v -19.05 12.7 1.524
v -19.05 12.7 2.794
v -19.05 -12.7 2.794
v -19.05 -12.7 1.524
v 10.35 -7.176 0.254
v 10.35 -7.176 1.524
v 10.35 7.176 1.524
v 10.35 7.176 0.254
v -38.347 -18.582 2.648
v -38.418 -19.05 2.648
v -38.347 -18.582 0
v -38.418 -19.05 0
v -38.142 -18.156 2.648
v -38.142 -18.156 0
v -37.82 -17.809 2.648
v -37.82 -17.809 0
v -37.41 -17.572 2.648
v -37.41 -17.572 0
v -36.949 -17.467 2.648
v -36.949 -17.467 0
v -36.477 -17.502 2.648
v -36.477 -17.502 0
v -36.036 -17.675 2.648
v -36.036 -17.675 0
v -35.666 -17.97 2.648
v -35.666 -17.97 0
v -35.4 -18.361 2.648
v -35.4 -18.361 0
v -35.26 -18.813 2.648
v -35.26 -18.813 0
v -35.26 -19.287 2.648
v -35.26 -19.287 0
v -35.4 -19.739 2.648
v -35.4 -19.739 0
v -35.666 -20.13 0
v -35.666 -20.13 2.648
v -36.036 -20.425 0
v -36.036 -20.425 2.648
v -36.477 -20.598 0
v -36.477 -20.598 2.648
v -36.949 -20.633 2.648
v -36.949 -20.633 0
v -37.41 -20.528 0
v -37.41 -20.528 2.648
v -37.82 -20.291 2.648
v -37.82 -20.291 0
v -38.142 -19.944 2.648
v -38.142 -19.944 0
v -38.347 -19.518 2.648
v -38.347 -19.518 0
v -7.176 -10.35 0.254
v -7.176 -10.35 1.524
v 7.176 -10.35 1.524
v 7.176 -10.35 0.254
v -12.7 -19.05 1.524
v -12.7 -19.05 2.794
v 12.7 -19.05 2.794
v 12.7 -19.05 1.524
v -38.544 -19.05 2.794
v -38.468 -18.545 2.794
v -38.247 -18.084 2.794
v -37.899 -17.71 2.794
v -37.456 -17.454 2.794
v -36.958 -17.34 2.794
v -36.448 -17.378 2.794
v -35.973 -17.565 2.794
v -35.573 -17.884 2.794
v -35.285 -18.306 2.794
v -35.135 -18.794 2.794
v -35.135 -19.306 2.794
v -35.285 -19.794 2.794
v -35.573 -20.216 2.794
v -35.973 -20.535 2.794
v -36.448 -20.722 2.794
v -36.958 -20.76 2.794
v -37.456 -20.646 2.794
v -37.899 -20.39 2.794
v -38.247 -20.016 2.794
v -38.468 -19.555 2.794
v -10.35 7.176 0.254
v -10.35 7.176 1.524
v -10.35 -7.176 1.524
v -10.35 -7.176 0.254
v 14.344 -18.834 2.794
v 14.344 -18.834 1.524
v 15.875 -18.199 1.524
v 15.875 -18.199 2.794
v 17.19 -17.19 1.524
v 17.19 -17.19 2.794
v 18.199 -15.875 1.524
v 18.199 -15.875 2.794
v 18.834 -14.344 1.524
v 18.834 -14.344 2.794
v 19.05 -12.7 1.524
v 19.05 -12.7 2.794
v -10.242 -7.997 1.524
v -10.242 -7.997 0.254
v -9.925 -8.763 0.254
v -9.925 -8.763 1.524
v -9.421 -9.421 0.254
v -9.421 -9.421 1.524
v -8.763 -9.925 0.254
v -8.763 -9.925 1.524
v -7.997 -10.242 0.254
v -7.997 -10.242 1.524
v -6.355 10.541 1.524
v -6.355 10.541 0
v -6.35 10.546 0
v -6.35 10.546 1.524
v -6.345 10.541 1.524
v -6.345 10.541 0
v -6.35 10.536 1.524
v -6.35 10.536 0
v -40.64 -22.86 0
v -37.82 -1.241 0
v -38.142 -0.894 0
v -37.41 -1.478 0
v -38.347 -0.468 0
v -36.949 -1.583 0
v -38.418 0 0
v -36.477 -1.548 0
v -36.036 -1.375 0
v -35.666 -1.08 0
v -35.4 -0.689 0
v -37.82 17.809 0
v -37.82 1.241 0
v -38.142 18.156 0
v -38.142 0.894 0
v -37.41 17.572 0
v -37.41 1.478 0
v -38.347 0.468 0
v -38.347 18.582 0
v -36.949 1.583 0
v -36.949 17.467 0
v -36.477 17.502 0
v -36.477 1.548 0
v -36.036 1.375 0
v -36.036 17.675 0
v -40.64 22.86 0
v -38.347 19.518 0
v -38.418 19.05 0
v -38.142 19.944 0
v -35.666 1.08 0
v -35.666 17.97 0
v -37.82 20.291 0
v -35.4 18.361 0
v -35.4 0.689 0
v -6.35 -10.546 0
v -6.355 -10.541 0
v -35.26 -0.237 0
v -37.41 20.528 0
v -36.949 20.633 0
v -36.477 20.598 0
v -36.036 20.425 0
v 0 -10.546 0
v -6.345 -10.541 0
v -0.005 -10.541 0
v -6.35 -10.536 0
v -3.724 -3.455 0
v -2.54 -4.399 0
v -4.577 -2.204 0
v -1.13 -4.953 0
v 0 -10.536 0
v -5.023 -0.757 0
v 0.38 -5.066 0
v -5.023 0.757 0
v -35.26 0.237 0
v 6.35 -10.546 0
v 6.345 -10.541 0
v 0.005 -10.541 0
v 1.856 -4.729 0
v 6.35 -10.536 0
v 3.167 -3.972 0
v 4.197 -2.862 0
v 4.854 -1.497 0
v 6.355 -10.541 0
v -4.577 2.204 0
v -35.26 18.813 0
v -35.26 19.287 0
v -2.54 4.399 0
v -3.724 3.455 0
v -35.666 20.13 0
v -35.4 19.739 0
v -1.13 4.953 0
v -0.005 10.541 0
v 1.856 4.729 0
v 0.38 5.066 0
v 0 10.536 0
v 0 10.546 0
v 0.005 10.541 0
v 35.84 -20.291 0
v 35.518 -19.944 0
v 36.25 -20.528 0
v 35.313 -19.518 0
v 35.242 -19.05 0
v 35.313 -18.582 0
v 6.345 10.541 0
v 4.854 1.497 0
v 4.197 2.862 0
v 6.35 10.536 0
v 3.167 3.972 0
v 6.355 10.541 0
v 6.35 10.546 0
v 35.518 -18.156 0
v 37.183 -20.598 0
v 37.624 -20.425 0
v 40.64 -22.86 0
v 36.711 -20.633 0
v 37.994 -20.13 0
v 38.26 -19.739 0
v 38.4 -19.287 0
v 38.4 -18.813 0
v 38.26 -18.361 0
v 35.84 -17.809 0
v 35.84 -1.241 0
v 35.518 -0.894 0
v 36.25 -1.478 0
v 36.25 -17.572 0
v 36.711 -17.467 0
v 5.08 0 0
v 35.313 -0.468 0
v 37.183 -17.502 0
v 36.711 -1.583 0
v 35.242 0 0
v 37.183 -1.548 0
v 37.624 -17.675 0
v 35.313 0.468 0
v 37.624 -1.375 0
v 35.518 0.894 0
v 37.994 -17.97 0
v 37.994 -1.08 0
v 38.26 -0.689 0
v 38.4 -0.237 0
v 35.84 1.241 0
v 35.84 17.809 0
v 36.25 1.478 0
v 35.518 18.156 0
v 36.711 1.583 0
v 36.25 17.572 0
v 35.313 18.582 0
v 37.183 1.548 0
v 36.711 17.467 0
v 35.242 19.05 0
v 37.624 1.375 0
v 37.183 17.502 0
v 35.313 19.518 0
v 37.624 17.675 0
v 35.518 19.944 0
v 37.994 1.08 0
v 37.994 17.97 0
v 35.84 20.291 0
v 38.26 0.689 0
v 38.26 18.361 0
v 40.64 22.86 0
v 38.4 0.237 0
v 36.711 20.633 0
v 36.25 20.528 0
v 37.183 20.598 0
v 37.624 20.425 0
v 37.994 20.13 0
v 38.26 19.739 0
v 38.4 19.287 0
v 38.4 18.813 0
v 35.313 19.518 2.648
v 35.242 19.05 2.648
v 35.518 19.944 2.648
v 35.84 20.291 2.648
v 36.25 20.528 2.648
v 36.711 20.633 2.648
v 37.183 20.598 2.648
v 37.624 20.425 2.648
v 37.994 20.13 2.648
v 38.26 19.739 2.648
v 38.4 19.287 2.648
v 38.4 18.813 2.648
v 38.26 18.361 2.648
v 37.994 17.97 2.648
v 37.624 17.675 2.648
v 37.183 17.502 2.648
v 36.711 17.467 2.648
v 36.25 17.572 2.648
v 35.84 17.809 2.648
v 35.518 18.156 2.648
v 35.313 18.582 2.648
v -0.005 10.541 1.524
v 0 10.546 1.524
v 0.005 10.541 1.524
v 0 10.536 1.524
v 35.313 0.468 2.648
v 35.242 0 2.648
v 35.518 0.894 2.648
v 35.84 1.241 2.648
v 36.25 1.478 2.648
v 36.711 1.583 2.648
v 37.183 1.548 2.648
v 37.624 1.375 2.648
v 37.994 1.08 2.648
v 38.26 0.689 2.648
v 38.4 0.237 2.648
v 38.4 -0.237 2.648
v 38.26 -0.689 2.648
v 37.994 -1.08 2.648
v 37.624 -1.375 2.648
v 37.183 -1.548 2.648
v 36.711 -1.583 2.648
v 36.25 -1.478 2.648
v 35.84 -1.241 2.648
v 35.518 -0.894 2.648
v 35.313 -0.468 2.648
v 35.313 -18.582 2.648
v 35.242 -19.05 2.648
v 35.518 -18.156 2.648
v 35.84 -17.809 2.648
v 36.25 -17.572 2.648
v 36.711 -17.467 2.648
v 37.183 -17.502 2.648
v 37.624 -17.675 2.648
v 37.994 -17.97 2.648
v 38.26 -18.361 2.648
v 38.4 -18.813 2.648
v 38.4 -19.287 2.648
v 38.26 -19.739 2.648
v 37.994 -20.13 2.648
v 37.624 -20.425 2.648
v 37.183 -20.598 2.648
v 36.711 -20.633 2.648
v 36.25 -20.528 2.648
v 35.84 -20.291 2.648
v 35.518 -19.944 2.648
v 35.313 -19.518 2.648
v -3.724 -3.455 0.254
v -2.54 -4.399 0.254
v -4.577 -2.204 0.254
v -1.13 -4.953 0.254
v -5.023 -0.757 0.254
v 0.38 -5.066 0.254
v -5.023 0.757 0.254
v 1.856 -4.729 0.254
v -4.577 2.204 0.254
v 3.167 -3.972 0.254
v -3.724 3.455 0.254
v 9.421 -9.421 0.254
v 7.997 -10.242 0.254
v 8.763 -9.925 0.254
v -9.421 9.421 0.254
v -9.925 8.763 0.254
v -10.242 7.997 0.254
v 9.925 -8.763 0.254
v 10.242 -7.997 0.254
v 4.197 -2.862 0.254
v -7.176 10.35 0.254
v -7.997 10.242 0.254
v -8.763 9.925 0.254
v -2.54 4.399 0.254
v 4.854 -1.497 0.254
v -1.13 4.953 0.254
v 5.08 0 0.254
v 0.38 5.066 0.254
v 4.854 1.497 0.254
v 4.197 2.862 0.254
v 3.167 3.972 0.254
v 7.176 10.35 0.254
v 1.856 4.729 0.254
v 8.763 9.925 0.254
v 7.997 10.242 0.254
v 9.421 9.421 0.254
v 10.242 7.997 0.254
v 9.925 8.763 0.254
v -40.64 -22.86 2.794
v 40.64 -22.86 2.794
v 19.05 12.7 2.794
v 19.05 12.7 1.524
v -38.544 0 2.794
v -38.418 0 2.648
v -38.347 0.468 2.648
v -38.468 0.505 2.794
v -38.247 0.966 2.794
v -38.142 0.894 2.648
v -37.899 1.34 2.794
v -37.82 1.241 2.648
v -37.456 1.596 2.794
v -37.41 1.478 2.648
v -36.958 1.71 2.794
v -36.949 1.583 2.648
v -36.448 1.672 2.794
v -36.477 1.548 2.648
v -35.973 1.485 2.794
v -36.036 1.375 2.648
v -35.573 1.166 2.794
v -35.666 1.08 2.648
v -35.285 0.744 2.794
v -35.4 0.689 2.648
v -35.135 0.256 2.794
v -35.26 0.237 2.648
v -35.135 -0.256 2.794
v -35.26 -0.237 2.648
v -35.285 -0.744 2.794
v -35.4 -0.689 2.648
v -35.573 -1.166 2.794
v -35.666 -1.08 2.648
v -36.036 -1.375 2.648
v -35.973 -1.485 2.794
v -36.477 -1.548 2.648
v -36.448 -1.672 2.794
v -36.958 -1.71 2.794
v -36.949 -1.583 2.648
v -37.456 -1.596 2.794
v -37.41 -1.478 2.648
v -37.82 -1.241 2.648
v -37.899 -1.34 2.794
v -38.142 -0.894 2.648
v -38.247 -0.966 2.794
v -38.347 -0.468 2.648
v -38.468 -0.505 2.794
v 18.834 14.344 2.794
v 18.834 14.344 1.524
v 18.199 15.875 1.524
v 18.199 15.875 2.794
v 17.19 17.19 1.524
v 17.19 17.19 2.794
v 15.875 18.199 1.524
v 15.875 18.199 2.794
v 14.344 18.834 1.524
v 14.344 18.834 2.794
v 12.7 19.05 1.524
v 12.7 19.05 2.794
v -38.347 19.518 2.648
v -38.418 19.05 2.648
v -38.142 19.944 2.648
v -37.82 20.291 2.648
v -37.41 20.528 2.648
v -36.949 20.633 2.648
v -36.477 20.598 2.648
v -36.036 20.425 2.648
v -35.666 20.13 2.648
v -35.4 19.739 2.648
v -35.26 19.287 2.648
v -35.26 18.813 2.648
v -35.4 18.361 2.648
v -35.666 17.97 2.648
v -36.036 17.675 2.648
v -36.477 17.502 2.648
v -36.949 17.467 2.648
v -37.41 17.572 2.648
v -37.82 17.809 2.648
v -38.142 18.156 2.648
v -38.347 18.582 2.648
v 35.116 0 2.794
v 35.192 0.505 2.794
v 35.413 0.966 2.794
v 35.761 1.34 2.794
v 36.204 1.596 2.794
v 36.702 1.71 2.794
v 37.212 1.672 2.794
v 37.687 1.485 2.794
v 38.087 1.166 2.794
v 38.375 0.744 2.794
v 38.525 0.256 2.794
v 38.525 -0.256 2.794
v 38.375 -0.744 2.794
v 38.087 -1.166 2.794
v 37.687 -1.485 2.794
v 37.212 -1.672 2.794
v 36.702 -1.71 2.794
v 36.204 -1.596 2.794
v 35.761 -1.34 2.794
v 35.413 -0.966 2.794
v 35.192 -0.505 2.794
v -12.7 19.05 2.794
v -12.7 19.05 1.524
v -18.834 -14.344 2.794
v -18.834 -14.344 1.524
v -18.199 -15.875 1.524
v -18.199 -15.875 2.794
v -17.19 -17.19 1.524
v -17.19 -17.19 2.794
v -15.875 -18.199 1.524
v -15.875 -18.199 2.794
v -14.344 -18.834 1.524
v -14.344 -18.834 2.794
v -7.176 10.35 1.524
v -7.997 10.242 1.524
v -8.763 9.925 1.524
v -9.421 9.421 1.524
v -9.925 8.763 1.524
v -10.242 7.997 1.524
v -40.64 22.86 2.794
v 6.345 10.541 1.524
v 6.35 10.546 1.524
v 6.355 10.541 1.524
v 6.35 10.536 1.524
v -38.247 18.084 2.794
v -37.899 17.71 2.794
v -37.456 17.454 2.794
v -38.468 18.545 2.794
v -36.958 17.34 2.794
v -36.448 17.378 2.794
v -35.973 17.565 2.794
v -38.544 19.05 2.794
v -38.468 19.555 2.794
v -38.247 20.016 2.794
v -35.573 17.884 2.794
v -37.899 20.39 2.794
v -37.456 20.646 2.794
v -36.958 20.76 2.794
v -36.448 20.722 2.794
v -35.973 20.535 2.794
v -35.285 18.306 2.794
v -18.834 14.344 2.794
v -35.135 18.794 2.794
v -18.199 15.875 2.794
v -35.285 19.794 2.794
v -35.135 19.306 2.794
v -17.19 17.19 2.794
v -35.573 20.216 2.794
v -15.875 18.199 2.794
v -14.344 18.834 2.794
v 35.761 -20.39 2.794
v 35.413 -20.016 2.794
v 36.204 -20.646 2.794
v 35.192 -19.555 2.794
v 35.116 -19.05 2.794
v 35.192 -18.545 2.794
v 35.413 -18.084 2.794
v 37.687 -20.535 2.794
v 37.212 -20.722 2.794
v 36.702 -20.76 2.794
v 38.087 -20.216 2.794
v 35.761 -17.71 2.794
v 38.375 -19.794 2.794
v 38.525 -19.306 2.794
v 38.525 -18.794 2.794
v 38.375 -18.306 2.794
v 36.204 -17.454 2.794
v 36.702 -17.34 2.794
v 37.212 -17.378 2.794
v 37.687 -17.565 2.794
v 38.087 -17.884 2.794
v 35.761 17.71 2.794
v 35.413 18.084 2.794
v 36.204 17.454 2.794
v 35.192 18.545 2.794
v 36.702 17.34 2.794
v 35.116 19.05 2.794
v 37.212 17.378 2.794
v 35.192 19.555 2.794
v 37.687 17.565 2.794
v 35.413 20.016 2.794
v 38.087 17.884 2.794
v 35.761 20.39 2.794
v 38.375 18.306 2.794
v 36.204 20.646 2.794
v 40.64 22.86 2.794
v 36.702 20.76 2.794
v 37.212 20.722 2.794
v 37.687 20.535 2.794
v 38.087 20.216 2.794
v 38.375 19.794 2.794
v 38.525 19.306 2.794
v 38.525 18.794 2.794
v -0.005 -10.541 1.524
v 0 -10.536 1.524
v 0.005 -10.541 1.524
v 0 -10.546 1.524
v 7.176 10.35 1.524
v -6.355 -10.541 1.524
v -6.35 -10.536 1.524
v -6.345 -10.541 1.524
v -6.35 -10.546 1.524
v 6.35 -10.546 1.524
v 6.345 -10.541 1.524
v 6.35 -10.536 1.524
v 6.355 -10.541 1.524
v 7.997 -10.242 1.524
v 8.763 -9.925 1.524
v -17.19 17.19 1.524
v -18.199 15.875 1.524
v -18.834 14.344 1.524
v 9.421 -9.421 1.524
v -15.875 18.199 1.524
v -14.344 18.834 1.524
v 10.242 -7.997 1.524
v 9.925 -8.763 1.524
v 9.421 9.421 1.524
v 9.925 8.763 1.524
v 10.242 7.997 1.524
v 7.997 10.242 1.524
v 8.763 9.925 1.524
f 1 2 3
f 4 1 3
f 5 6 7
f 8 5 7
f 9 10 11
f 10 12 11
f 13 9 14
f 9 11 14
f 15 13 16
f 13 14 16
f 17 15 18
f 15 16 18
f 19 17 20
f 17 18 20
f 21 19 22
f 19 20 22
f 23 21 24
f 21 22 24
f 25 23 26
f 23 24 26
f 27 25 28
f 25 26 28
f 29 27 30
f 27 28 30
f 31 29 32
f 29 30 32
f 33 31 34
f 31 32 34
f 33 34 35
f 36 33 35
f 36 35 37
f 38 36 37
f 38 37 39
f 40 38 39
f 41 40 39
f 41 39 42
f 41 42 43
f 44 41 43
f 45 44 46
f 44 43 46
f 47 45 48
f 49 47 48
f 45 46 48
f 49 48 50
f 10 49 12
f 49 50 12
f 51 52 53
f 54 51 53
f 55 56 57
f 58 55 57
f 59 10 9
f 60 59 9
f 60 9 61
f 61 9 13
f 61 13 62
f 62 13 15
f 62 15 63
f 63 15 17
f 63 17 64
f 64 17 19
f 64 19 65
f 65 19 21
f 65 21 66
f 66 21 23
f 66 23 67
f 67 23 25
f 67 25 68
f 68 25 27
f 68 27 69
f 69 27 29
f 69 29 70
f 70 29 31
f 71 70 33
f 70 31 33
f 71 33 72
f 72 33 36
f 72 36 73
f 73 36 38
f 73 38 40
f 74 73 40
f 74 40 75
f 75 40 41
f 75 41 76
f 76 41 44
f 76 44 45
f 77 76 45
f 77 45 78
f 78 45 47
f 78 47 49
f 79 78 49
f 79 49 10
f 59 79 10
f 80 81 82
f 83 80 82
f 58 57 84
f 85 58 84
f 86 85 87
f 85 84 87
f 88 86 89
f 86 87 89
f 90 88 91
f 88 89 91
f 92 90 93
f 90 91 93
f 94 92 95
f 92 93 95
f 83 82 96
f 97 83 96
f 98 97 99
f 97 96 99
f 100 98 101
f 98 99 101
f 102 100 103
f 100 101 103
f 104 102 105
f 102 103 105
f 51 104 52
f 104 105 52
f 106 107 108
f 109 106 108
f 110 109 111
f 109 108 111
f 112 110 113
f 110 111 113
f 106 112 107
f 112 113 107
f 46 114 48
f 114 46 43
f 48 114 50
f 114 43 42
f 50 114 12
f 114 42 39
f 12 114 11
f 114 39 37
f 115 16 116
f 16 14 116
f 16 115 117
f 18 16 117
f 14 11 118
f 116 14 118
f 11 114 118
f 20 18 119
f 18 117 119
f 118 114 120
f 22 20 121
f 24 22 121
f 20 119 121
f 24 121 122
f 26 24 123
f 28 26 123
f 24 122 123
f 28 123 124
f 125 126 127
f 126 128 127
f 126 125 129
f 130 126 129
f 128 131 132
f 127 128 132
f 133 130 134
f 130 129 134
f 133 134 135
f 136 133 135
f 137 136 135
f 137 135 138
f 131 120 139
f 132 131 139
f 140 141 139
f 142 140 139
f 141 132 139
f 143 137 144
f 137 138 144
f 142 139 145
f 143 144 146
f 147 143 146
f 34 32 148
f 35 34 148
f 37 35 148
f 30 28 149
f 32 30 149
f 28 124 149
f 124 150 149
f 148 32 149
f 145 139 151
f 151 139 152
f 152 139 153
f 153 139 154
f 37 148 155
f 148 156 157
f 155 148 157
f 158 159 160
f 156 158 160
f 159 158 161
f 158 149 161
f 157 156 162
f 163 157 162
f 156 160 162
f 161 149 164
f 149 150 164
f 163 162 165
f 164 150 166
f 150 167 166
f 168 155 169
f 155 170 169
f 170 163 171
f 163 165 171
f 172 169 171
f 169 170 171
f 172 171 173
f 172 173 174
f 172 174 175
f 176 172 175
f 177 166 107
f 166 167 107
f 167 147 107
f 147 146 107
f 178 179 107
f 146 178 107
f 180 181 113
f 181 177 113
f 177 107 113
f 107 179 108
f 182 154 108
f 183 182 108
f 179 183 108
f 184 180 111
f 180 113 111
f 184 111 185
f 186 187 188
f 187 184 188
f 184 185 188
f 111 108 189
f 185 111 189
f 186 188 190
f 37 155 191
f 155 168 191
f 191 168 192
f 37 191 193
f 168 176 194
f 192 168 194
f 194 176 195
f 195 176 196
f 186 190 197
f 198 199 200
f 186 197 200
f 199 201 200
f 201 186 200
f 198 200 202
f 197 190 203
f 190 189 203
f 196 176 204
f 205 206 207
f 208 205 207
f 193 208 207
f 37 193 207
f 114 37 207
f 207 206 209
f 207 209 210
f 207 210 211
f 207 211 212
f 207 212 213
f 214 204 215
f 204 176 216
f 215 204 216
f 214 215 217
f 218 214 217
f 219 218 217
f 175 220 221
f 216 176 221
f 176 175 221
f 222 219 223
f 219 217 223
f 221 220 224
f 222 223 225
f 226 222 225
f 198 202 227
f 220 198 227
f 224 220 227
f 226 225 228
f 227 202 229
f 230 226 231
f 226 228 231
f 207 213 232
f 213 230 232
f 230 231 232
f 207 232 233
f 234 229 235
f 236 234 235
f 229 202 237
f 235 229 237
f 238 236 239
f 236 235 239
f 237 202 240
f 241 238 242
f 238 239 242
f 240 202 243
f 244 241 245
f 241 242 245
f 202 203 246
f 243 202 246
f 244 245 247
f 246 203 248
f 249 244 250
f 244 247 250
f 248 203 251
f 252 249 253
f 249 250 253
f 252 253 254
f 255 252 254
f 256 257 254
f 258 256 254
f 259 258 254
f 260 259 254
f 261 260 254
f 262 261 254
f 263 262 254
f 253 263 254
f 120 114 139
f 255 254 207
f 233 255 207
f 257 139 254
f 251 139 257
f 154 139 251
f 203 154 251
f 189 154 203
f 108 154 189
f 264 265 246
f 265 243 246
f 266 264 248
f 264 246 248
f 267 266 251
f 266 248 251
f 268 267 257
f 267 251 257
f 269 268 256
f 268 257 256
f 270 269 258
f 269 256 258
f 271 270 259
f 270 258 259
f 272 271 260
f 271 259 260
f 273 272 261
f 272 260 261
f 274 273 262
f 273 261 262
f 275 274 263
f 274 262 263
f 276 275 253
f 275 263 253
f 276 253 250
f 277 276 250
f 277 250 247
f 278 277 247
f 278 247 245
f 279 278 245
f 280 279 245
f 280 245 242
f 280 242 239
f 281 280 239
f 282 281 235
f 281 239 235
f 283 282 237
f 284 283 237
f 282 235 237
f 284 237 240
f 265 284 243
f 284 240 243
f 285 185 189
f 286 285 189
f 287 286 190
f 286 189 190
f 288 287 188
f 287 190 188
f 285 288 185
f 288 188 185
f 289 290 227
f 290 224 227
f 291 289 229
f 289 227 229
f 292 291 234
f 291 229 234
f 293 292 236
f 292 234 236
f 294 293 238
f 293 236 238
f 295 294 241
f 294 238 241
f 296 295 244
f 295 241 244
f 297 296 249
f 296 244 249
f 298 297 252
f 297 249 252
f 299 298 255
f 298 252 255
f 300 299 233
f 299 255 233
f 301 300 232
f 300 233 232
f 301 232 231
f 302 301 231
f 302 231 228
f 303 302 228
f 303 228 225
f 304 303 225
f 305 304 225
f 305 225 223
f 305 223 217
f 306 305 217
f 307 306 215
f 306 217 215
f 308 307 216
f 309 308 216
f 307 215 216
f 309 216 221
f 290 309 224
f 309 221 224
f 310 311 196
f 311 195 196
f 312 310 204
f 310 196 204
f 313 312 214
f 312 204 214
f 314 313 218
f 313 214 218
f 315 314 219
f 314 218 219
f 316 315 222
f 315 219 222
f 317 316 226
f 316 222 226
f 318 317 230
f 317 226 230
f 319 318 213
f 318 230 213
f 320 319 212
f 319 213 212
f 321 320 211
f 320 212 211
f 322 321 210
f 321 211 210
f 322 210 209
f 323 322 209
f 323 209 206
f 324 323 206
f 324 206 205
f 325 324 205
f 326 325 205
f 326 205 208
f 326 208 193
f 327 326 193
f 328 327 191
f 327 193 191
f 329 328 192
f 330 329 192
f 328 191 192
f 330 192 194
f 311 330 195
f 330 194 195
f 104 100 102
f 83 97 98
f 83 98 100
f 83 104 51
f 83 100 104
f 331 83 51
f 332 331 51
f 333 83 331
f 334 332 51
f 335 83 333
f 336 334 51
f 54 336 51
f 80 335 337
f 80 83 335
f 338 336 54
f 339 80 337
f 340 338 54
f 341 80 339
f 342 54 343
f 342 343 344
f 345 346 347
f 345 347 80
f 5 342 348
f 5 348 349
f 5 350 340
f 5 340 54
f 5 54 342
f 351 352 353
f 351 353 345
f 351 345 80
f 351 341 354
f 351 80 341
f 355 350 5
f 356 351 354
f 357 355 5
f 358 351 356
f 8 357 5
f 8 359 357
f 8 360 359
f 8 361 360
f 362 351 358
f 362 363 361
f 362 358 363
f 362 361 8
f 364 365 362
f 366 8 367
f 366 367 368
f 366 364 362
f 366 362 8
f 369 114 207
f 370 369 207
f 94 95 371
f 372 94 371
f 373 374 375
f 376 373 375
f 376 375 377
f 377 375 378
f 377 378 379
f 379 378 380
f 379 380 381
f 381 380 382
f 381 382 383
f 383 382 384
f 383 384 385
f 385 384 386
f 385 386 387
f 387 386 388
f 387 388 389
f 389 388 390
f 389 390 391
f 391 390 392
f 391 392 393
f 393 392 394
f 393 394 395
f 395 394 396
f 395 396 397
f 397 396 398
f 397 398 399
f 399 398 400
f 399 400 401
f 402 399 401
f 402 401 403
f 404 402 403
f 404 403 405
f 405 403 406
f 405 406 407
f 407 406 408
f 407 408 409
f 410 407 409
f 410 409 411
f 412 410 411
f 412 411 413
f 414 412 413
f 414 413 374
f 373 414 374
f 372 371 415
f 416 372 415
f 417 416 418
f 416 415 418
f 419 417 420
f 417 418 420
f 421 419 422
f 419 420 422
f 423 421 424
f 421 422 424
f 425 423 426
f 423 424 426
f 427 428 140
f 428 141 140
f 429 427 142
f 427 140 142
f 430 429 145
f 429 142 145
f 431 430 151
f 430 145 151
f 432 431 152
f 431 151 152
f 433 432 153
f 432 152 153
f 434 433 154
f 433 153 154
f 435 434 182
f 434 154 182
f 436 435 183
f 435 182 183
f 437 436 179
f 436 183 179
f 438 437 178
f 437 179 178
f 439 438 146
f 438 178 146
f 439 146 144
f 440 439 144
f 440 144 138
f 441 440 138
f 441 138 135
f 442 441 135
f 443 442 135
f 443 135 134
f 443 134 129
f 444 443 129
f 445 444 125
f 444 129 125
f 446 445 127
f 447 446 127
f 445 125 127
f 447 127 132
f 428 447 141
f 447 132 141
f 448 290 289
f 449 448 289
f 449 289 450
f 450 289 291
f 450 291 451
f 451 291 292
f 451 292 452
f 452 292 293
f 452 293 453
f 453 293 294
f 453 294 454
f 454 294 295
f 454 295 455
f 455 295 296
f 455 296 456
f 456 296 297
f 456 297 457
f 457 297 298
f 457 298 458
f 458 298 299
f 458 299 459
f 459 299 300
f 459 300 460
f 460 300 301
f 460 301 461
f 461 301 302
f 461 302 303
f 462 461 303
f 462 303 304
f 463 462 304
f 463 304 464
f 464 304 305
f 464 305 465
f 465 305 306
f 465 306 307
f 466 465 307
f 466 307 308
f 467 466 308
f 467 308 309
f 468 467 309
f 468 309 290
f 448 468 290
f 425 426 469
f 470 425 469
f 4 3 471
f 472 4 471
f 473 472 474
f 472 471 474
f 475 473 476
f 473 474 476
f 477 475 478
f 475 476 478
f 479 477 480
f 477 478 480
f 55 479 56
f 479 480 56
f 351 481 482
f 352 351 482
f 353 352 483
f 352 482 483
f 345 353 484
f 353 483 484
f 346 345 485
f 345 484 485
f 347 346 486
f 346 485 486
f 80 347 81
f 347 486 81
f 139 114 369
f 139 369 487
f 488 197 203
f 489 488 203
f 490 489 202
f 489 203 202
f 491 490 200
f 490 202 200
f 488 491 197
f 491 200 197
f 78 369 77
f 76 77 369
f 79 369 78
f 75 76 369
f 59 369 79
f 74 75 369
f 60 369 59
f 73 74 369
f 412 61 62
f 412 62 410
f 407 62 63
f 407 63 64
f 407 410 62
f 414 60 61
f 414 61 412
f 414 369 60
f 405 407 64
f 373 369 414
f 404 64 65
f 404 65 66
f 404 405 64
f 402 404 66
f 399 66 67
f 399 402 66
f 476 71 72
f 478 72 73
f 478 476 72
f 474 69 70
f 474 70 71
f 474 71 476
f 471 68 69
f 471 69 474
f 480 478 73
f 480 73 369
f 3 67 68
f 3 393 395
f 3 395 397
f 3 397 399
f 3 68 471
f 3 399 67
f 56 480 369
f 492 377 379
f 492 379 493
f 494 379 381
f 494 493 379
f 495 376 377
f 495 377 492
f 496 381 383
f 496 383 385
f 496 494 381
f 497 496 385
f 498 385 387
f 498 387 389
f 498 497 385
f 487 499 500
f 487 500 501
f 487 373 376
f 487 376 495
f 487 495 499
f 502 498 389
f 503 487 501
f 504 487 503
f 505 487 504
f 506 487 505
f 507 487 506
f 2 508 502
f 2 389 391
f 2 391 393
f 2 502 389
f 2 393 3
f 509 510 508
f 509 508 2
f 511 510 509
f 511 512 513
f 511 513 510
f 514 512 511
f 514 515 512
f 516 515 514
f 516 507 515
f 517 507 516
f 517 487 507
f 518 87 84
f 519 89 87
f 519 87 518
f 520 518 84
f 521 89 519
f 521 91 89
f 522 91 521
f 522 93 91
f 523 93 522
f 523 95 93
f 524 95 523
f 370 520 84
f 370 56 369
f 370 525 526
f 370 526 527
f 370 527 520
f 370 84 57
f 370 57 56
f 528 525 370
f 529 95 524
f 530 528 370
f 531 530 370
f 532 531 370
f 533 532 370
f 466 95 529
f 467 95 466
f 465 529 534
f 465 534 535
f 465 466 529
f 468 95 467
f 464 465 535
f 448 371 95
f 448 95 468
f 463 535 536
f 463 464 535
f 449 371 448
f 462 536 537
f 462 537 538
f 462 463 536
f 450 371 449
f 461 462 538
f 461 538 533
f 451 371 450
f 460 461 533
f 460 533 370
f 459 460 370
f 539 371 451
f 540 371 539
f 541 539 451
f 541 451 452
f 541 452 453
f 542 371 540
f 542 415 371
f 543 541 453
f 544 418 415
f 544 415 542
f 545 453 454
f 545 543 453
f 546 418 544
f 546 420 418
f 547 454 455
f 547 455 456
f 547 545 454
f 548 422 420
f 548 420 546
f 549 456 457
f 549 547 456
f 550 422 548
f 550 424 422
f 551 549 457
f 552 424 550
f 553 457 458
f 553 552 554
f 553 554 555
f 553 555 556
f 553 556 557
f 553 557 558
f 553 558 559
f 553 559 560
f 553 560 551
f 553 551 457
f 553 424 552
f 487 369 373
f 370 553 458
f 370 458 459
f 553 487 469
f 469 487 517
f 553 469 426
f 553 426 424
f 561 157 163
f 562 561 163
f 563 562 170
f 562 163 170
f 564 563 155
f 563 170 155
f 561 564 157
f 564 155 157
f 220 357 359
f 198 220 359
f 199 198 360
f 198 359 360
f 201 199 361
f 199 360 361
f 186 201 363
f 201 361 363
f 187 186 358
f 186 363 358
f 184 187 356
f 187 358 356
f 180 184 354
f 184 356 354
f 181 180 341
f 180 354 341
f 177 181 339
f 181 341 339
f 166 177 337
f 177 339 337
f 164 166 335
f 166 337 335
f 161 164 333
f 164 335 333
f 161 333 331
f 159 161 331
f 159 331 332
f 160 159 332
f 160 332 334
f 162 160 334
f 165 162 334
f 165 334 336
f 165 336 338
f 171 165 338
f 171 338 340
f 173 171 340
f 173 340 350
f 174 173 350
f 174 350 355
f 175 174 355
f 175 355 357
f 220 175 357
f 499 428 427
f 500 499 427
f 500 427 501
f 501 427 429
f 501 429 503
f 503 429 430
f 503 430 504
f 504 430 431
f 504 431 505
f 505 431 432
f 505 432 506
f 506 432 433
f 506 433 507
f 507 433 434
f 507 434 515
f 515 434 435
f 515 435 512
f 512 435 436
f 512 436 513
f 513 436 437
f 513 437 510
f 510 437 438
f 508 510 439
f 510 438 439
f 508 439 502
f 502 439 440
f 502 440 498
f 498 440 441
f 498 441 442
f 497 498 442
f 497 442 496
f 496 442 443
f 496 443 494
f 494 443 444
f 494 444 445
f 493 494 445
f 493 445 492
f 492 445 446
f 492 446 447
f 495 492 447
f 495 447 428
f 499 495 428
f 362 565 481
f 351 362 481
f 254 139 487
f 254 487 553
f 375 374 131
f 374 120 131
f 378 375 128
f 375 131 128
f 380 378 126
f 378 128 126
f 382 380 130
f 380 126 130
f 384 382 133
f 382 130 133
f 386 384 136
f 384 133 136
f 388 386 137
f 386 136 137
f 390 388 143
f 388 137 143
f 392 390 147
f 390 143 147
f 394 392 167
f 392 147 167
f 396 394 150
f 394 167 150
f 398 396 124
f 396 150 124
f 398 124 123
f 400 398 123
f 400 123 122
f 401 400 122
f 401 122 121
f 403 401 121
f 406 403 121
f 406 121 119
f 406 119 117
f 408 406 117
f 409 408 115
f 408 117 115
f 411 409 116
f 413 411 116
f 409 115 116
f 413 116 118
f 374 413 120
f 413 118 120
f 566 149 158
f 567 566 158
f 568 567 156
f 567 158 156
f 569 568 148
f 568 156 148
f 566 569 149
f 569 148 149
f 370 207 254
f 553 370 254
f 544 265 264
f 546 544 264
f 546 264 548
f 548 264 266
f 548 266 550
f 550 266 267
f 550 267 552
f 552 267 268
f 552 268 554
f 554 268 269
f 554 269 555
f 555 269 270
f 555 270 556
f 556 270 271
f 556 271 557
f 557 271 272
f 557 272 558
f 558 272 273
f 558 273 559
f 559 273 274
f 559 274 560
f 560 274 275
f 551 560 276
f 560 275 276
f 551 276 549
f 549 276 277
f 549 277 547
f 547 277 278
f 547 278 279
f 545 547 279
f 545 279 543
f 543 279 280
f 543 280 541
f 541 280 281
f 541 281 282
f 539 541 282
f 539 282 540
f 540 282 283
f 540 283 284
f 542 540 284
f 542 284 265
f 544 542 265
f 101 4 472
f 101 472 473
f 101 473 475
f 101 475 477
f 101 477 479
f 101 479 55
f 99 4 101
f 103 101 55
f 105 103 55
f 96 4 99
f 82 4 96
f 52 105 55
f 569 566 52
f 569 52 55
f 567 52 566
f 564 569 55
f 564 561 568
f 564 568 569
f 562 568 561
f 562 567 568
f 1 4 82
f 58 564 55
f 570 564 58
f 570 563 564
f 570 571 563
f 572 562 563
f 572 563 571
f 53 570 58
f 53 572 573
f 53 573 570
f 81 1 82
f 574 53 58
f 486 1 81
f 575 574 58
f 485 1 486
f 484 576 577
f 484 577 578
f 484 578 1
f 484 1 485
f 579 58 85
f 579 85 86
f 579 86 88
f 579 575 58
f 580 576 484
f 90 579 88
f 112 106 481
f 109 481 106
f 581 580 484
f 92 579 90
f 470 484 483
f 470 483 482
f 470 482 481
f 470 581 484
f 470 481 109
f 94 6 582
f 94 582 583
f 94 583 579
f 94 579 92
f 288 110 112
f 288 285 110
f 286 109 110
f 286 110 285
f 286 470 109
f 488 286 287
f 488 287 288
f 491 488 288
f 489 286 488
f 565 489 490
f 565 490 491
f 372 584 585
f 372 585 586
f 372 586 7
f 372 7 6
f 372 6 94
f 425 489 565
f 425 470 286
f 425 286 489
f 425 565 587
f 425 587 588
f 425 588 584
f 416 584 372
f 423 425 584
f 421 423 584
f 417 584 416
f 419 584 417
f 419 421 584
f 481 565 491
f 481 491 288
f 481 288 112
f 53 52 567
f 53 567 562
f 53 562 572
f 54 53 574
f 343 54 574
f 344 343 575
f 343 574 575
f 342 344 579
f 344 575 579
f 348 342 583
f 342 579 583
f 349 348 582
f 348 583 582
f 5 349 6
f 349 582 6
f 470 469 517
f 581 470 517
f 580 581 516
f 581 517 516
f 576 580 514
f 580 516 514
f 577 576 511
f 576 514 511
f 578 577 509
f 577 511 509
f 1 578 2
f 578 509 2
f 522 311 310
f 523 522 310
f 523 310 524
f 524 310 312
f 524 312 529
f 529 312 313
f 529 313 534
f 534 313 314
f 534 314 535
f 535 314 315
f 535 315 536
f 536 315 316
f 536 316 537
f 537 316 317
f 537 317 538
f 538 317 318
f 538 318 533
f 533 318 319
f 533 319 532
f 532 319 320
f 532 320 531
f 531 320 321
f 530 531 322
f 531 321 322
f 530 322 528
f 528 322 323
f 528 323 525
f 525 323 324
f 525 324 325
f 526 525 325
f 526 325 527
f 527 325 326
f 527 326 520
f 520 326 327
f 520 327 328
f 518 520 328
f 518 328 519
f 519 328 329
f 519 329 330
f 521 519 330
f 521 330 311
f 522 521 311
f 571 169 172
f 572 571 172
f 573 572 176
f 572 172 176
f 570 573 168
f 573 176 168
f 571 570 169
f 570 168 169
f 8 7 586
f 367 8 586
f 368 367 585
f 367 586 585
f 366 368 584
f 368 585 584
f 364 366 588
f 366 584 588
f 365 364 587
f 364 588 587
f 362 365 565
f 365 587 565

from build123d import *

# Parameters (mm, degrees)
F0_W           = 81.28
F0_H           = 45.72
F1_DEPTH       = 2.794
F3_DEPTH       = 1.27
F4_DEPTH       = 2.54
F2_R           = 5.08
F5_DEPTH       = 2.795
F6_D           = 3.175
F6_CSINK_D     = 3.429
F6_CSINK_ANGLE = 82
F8_D           = 0.01016
F8_DEPTH       = 7.62


with BuildPart() as f1:
    # F0 (on Top) → F1 (new body)
    with BuildSketch(Plane.XY):
        Rectangle(F0_W, F0_H)
    extrude(amount=F1_DEPTH)

    # F2 (on face) → F3 (cut)
    with BuildSketch(Plane.XY.offset(2.794)):
        with BuildLine():
            ThreePointArc((19.05, 12.7), (17.190128, 17.190128), (12.7, 19.05))
            Line((12.7, 19.05), (-12.7, 19.05))
            ThreePointArc((-12.7, 19.05), (-17.190128, 17.190128), (-19.05, 12.7))
            Line((-19.05, 12.7), (-19.05, -12.7))
            ThreePointArc((-19.05, -12.7), (-17.190128, -17.190128), (-12.7, -19.05))
            Line((-12.7, -19.05), (12.7, -19.05))
            ThreePointArc((12.7, -19.05), (17.190128, -17.190128), (19.05, -12.7))
            Line((19.05, -12.7), (19.05, 12.7))
        make_face()
        with BuildLine():
            Line((-7.1755, 10.3505), (7.1755, 10.3505))
            ThreePointArc((7.1755, 10.3505), (9.420564, 9.420564), (10.3505, 7.1755))
            Line((10.3505, 7.1755), (10.3505, -7.1755))
            ThreePointArc((10.3505, -7.1755), (9.420564, -9.420564), (7.1755, -10.3505))
            Line((7.1755, -10.3505), (-7.1755, -10.3505))
            ThreePointArc((-7.1755, -10.3505), (-9.420564, -9.420564), (-10.3505, -7.1755))
            Line((-10.3505, -7.1755), (-10.3505, 7.1755))
            ThreePointArc((-10.3505, 7.1755), (-9.420564, 9.420564), (-7.1755, 10.3505))
        make_face(mode=Mode.SUBTRACT)
    extrude(amount=-F3_DEPTH, mode=Mode.SUBTRACT)

    # F3_face (on face) → F4 (cut)
    with BuildSketch(Plane.XY.offset(2.794)):
        with BuildLine():
            Line((7.1755, 10.3505), (-7.1755, 10.3505))
            ThreePointArc((-7.1755, 10.3505), (-9.420564, 9.420564), (-10.3505, 7.1755))
            Line((-10.3505, 7.1755), (-10.3505, -7.1755))
            ThreePointArc((-10.3505, -7.1755), (-9.420564, -9.420564), (-7.1755, -10.3505))
            Line((-7.1755, -10.3505), (7.1755, -10.3505))
            ThreePointArc((7.1755, -10.3505), (9.420564, -9.420564), (10.3505, -7.1755))
            Line((10.3505, -7.1755), (10.3505, 7.1755))
            ThreePointArc((10.3505, 7.1755), (9.420564, 9.420564), (7.1755, 10.3505))
        make_face()
    extrude(amount=-F4_DEPTH, mode=Mode.SUBTRACT)

    # F2 (on face) → F5 (cut, through all)
    with BuildSketch(Plane.XY.offset(2.794)):
        Circle(F2_R)
    extrude(amount=-F5_DEPTH, mode=Mode.SUBTRACT)

    # F6 (through all)
    with Locations(Plane.XY.offset(2.794)):
        with Locations((-36.83, 19.05), (-36.83, -19.05), (36.83, -19.05), (36.83, 19.05), (-36.83, 0), (36.83, 0)):
            CounterSinkHole(F6_D / 2, F6_CSINK_D / 2, counter_sink_angle=F6_CSINK_ANGLE)

    # F8
    with Locations(Plane.XY.offset(2.794)):
        with Locations((-6.35, 10.541), (0, 10.541), (6.35, 10.541), (6.35, -10.541), (0, -10.541), (-6.35, -10.541)):
            Hole(F8_D / 2, depth=F8_DEPTH)


solid = f1.part
